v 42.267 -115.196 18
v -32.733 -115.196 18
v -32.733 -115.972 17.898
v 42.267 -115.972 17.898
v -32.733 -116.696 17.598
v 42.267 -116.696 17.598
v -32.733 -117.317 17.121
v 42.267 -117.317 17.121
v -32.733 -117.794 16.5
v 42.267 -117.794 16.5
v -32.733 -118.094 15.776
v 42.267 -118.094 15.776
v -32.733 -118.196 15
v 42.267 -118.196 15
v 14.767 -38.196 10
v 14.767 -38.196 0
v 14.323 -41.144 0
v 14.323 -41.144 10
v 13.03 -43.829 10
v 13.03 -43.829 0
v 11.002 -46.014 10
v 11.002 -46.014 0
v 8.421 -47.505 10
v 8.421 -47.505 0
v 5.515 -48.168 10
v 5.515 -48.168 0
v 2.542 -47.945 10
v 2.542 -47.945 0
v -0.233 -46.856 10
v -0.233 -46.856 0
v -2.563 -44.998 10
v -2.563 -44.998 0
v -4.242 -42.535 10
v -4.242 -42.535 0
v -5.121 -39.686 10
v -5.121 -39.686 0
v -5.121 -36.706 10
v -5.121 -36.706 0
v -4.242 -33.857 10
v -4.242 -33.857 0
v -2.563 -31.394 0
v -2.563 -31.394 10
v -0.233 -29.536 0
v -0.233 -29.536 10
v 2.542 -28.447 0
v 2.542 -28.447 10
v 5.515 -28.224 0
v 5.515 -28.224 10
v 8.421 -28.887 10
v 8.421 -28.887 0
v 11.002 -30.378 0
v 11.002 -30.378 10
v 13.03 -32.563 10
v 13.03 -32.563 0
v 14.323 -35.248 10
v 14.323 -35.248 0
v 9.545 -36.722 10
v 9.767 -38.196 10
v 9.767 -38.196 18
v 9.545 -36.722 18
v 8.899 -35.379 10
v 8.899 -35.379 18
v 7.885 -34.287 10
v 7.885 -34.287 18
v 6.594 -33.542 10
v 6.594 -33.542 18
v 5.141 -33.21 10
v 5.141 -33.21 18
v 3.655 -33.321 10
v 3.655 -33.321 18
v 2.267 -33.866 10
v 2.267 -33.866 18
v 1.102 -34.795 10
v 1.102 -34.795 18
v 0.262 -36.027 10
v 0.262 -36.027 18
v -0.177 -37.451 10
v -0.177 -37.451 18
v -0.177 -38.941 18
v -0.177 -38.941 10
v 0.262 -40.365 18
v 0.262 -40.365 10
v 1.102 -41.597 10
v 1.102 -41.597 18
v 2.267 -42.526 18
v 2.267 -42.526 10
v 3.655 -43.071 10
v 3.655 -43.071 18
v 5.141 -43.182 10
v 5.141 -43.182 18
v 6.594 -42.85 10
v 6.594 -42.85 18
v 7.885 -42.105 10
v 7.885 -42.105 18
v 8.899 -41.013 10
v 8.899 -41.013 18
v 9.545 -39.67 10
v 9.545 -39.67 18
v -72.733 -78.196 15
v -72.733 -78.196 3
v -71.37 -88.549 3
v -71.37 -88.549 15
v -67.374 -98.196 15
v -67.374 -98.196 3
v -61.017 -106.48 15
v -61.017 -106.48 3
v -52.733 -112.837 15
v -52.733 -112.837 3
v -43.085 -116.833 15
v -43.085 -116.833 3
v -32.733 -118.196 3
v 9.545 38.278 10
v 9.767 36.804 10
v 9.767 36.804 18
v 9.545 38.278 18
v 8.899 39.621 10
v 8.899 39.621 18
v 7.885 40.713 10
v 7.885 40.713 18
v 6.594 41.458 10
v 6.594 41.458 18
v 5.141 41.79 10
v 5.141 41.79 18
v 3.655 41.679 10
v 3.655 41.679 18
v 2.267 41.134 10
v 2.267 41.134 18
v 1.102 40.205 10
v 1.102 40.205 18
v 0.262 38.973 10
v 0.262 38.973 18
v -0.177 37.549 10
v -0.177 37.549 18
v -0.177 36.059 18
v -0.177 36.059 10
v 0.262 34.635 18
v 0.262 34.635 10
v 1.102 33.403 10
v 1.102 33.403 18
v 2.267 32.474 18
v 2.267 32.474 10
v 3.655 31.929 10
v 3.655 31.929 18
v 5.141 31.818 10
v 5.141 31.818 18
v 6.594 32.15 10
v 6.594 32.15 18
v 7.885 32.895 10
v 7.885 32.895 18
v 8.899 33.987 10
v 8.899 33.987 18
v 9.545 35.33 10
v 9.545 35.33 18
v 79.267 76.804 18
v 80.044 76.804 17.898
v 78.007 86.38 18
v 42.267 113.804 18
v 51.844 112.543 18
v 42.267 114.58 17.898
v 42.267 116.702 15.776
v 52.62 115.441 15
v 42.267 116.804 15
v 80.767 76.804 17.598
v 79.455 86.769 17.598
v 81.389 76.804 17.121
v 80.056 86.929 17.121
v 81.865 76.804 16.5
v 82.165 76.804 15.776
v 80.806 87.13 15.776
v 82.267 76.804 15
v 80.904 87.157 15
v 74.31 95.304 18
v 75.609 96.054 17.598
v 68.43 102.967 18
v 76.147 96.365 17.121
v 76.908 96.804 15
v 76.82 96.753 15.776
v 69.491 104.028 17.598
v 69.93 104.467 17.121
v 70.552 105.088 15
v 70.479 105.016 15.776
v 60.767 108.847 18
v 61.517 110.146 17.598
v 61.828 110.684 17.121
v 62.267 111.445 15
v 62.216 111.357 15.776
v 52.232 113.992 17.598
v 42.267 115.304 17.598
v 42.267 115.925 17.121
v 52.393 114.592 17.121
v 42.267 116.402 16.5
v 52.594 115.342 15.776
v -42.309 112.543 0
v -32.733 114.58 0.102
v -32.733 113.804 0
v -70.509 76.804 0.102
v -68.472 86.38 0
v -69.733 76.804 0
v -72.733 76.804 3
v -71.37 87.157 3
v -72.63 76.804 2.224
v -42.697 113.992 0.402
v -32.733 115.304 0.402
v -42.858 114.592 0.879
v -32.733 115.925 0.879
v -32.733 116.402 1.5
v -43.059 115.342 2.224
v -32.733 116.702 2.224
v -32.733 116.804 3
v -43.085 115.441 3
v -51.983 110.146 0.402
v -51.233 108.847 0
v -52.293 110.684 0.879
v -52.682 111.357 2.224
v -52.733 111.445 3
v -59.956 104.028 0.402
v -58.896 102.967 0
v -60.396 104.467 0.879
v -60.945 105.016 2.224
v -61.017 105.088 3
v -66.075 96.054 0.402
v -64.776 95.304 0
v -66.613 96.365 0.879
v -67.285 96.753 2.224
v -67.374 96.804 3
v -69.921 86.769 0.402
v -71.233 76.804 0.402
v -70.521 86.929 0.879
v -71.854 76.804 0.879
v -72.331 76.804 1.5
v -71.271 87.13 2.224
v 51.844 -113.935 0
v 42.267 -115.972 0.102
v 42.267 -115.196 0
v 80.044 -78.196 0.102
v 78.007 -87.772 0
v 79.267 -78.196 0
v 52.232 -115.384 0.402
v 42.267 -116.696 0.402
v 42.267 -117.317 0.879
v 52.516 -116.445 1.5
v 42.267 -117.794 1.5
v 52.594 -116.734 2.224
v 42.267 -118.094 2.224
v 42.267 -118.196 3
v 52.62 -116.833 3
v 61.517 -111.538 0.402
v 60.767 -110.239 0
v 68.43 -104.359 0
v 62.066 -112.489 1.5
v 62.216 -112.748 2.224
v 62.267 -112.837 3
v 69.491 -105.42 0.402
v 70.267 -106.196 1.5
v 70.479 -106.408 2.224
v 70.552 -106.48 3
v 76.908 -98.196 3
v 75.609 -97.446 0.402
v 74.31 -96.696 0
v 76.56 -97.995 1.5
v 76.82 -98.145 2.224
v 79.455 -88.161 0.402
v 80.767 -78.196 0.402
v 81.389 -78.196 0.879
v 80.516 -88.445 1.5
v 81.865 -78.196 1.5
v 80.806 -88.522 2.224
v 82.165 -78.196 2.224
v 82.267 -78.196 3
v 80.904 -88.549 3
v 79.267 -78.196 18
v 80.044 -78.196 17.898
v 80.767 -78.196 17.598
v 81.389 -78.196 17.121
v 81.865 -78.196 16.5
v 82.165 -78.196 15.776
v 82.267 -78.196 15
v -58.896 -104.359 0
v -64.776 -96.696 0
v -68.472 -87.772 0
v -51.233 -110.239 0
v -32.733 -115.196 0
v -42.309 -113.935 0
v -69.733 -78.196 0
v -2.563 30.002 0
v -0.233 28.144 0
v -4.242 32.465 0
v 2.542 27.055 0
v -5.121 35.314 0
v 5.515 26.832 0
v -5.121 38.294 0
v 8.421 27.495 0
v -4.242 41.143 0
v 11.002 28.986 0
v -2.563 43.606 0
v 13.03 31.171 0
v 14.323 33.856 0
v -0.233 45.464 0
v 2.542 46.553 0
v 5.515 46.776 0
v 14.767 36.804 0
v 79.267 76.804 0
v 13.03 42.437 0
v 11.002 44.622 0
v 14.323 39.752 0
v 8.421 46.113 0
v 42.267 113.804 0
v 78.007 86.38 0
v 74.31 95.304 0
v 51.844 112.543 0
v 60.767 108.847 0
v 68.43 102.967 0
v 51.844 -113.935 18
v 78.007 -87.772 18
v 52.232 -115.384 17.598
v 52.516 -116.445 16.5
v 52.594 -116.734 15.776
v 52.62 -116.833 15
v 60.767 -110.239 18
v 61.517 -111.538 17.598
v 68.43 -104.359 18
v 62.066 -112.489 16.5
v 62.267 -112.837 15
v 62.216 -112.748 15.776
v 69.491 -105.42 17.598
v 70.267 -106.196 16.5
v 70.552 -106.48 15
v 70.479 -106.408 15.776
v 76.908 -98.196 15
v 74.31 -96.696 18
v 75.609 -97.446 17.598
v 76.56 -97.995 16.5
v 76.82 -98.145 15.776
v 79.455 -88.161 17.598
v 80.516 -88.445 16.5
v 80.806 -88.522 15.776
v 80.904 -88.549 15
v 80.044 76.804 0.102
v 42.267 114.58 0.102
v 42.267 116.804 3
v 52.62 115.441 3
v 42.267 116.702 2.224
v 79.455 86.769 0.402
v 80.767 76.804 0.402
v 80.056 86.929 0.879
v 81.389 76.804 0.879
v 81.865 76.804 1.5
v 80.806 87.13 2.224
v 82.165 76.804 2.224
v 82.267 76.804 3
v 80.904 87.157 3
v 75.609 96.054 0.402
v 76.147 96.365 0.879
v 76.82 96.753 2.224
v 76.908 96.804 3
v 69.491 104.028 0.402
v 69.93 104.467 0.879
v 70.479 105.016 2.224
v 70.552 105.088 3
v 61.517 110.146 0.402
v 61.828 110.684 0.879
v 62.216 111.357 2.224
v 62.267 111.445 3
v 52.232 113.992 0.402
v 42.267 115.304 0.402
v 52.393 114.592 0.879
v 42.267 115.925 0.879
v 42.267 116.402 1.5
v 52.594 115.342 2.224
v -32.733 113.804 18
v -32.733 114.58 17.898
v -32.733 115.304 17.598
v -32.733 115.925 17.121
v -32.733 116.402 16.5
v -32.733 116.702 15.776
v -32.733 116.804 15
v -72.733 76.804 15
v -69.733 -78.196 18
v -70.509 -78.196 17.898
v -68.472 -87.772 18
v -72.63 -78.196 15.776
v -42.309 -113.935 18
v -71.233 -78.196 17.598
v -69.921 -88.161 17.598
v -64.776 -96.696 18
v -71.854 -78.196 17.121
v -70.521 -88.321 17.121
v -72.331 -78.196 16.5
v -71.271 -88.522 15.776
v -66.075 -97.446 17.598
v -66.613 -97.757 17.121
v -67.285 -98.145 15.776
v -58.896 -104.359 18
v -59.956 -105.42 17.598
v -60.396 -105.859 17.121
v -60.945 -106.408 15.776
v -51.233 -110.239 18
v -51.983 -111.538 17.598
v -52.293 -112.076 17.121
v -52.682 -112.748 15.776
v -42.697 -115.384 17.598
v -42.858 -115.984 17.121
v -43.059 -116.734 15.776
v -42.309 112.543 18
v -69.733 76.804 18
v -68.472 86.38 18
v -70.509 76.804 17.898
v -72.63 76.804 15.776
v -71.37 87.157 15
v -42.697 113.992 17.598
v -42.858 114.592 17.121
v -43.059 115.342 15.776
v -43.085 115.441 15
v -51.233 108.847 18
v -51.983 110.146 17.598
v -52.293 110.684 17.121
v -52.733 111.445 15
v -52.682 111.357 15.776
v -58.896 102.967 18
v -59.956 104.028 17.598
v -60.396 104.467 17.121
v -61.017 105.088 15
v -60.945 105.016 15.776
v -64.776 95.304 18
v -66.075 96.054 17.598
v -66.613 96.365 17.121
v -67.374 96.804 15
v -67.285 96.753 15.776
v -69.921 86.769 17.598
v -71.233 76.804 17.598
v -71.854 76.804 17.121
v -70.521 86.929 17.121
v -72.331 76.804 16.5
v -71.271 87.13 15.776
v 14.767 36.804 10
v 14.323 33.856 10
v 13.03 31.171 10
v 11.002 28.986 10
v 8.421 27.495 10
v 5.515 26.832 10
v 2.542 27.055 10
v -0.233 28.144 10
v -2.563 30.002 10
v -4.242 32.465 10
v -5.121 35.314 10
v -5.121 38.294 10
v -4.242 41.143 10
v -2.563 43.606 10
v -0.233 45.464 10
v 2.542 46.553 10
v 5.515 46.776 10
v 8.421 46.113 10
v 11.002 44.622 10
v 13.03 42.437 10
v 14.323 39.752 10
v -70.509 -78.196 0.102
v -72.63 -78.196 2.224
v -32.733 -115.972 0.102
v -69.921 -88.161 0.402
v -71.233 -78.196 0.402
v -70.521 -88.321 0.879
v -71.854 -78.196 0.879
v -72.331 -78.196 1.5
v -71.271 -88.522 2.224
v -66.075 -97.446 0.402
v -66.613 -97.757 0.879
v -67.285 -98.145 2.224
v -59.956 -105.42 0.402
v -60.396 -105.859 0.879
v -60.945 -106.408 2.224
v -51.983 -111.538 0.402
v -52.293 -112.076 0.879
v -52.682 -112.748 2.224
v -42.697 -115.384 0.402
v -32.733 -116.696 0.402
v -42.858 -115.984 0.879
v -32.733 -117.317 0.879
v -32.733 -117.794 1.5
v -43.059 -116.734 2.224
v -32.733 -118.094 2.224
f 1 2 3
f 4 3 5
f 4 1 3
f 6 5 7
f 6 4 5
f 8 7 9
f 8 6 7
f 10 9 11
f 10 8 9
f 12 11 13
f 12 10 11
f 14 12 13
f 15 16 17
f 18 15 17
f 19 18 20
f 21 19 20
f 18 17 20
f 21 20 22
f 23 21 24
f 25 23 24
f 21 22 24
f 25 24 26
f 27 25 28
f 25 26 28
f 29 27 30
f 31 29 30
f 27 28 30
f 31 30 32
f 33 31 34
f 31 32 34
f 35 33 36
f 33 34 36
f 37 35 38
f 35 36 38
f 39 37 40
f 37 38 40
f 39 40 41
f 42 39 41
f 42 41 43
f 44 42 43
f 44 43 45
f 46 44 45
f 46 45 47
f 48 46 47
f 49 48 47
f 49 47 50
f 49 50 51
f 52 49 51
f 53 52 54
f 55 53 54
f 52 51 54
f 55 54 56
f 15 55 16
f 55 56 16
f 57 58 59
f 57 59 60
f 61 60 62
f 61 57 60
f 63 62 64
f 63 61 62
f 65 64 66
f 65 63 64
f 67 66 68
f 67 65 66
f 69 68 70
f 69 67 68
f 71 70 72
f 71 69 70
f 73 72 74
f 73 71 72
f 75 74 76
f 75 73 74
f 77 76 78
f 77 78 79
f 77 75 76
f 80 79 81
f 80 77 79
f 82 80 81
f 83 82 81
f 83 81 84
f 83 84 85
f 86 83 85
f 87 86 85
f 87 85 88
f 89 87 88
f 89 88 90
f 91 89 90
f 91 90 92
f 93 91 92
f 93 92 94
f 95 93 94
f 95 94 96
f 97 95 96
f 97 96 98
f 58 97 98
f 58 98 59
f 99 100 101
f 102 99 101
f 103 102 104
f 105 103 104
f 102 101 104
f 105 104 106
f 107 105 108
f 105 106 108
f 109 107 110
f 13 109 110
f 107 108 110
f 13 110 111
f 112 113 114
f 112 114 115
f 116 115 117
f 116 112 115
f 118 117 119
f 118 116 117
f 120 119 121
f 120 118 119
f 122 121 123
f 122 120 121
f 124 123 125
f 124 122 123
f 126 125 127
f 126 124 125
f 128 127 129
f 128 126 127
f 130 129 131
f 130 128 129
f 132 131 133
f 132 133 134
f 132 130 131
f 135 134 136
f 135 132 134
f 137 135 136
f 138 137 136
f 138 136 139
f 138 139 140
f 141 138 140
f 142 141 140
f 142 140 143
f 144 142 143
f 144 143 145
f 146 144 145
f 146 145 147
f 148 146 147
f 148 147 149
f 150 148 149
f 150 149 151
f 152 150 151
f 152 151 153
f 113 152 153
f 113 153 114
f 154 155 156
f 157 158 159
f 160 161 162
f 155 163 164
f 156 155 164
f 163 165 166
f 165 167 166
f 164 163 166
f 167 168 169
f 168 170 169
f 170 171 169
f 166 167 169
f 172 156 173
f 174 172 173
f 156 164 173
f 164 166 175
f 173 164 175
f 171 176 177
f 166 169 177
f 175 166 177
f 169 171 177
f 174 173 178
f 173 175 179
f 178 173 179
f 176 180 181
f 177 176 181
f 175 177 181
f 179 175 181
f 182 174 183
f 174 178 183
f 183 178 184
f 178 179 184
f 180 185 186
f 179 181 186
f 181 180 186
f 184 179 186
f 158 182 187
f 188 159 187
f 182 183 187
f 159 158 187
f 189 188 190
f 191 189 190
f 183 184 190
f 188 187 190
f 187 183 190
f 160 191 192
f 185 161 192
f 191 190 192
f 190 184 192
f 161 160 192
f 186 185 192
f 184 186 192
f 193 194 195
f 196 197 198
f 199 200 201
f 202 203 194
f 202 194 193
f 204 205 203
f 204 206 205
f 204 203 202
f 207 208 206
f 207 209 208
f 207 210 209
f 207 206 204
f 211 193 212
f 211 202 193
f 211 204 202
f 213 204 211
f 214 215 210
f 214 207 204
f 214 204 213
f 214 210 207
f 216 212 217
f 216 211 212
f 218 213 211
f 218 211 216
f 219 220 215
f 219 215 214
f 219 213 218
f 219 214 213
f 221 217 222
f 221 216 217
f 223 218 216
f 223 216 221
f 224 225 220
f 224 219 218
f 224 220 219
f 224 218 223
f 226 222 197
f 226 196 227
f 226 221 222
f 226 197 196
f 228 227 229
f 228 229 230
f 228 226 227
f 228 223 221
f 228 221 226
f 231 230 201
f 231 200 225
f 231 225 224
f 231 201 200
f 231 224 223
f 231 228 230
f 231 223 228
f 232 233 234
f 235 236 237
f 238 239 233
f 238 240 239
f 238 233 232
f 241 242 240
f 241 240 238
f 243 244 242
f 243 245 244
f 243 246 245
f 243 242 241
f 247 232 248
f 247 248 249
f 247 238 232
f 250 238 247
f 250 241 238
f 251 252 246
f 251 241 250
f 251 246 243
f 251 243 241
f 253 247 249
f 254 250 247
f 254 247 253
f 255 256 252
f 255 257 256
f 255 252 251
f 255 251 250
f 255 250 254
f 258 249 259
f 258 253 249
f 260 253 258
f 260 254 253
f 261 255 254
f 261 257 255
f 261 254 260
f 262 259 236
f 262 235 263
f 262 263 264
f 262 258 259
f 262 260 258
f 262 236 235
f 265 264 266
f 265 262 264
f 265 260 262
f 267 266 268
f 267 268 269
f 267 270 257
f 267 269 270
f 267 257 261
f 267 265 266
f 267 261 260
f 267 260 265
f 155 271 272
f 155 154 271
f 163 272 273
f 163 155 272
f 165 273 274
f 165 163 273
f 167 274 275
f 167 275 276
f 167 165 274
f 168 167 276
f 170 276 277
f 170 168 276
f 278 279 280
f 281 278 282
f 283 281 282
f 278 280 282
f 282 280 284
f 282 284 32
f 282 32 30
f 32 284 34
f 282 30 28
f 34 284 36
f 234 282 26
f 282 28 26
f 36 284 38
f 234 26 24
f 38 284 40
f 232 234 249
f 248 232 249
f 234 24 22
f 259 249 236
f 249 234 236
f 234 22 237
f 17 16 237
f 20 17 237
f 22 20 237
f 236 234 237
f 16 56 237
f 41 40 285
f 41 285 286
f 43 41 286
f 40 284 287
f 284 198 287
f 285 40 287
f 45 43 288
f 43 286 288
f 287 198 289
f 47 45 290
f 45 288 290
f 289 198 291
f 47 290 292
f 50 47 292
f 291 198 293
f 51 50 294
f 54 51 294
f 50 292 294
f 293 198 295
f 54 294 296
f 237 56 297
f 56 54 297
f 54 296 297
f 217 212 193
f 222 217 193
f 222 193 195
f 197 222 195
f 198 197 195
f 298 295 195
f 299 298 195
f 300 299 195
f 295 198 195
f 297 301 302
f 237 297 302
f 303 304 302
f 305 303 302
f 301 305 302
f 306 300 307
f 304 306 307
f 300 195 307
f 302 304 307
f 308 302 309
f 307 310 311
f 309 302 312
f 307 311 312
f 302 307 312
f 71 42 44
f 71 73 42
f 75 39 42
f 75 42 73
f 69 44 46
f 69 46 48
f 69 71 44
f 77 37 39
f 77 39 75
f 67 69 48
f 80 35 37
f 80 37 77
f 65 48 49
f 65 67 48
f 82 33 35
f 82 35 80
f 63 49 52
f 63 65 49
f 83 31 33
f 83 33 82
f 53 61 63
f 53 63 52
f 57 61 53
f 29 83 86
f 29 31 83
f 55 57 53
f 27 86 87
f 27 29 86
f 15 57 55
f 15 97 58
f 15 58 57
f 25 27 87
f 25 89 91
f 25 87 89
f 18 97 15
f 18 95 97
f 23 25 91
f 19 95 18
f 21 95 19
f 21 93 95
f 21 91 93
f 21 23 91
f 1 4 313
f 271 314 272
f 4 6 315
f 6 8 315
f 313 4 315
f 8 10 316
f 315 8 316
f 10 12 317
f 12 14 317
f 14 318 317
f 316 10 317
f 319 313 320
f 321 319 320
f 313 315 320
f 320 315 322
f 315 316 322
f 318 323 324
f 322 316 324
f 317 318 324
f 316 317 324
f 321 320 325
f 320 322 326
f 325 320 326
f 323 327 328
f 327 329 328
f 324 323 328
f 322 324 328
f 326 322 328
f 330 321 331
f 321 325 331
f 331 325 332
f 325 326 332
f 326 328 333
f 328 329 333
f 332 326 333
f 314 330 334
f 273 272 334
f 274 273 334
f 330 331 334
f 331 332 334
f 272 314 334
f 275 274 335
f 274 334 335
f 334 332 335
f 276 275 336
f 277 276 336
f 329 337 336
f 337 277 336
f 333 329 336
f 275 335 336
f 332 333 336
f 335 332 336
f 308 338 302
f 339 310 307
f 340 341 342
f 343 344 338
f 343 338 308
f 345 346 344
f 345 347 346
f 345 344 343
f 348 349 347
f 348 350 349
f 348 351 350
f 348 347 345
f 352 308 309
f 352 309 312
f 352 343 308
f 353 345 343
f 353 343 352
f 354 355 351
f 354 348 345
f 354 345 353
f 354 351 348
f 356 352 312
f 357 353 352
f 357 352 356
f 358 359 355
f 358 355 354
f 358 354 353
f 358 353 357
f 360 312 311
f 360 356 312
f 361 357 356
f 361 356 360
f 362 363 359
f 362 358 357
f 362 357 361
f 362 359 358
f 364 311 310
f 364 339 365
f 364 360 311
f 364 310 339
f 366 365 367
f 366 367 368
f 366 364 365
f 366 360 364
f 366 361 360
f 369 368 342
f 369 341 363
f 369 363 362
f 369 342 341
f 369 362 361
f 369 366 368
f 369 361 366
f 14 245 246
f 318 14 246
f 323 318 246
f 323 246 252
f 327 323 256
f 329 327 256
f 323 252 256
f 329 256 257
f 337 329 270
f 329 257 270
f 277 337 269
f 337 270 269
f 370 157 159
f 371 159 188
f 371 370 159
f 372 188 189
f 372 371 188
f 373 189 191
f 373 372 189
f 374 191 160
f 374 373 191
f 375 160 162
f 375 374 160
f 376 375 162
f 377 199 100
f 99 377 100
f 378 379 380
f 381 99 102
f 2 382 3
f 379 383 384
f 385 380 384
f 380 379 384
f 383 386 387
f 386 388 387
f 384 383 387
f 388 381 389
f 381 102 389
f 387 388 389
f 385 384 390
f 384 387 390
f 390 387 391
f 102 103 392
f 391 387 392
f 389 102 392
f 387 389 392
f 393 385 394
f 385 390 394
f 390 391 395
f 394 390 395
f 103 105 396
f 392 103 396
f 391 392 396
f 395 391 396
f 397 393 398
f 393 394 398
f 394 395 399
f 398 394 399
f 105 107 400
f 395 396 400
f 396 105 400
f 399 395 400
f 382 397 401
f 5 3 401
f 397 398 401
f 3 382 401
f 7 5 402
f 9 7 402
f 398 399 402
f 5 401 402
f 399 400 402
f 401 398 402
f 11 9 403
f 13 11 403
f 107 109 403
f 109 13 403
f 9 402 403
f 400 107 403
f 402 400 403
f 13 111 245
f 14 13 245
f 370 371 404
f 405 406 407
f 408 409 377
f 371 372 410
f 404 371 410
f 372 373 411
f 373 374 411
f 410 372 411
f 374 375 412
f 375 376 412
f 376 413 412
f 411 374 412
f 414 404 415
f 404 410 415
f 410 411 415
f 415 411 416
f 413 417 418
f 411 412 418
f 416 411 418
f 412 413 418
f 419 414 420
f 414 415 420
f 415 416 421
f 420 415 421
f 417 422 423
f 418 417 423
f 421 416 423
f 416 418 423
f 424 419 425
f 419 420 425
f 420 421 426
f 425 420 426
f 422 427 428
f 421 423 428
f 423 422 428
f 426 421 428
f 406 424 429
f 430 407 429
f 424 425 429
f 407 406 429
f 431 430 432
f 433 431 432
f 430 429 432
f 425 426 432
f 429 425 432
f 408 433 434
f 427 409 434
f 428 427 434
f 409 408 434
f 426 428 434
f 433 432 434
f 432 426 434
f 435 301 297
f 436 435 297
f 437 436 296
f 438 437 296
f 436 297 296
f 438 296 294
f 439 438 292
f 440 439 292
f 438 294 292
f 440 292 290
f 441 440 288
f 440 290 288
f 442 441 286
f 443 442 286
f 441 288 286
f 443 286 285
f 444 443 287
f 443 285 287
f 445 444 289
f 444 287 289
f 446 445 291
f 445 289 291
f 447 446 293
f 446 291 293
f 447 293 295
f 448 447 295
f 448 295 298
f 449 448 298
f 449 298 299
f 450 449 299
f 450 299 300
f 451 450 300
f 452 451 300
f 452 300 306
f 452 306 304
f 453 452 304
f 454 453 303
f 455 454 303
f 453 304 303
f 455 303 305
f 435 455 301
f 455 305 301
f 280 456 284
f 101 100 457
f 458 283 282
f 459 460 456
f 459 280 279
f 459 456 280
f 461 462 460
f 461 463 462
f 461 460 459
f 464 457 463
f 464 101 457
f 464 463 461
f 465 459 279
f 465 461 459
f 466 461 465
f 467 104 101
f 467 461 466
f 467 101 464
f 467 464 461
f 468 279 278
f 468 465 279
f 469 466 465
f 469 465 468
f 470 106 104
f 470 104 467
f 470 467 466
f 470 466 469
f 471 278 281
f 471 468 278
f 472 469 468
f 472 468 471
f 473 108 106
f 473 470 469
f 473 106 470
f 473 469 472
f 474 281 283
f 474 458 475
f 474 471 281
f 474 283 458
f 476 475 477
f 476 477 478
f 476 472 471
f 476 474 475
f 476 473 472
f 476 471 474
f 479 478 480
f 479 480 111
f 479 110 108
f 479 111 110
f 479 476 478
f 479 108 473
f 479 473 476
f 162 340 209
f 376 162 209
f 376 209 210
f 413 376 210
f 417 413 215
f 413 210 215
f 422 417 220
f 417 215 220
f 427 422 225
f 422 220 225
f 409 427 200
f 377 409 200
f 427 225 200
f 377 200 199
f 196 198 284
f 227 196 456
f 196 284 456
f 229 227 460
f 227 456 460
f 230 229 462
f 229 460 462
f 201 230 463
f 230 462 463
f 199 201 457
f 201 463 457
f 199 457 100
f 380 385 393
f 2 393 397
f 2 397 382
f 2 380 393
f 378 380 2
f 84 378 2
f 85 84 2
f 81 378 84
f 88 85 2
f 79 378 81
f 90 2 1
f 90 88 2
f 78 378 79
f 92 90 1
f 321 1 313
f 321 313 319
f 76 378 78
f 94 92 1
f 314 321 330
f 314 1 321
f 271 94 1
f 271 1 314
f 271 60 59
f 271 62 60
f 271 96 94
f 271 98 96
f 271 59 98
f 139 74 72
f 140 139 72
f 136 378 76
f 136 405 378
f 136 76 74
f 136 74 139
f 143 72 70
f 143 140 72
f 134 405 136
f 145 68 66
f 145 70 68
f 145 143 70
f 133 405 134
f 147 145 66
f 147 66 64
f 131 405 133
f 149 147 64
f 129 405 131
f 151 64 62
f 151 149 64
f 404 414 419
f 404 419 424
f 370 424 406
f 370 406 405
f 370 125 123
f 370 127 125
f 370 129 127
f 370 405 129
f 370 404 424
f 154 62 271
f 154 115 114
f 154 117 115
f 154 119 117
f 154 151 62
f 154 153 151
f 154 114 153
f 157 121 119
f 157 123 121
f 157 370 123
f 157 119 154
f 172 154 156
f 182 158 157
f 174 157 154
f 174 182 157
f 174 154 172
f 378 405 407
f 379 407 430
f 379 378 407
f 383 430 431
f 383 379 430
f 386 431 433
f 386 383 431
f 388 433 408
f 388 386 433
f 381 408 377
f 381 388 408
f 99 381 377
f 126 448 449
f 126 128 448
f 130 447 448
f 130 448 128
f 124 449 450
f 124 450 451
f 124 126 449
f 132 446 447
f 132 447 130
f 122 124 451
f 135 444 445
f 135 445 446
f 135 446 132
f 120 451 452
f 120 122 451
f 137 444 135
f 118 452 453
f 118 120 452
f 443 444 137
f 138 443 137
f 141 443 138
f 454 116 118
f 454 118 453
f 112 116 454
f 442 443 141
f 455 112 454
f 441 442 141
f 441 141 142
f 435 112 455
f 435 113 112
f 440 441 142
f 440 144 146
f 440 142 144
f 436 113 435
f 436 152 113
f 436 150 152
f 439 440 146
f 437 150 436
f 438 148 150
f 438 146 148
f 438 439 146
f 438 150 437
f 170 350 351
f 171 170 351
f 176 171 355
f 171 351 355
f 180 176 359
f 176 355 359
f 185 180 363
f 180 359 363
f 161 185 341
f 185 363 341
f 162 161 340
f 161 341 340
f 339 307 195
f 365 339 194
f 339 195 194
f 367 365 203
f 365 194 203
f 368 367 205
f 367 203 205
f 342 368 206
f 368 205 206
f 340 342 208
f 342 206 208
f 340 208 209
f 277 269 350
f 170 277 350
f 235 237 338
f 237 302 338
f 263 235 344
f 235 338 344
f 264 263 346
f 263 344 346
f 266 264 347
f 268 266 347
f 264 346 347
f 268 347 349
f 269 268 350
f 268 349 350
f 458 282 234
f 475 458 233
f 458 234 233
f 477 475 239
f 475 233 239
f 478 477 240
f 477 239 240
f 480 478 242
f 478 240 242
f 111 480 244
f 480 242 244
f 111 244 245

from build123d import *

# Parameters (mm, degrees)
F0_R     = 5
F1_DEPTH = 18
F2_R     = 10
F3_DEPTH = 10
F4_R     = 3


with BuildPart() as f1:
    # F0 (on Top) → F1 (new body)
    with BuildSketch(Plane.XY):
        with BuildLine():
            ThreePointArc((-72.732671, -78.195973), (-61.016942, -106.480244), (-32.732671, -118.195973))
            Line((-32.732671, -118.195973), (42.267329, -118.195973))
            ThreePointArc((42.267329, -118.195973), (70.5516, -106.480244), (82.267329, -78.195973))
            Line((82.267329, -78.195973), (82.267329, 76.804027))
            ThreePointArc((82.267329, 76.804027), (70.5516, 105.088298), (42.267329, 116.804027))
            Line((42.267329, 116.804027), (-32.732671, 116.804027))
            ThreePointArc((-32.732671, 116.804027), (-61.016942, 105.088298), (-72.732671, 76.804027))
            Line((-72.732671, 76.804027), (-72.732671, -78.195973))
        make_face()
        with Locations((4.767329, -38.195973)):
            Circle(F0_R, mode=Mode.SUBTRACT)
        with Locations((4.767329, 36.804027)):
            Circle(F0_R, mode=Mode.SUBTRACT)
    extrude(amount=F1_DEPTH)

    # F2 (on face) → F3 (cut)
    with BuildSketch(Plane(origin=(0, 0, 0), x_dir=(1, 0, 0), z_dir=(0, 0, -1))):
        with Locations((4.767329, 38.195973)):
            Circle(F2_R)
        with Locations((4.767329, -36.804027)):
            Circle(F2_R)
    extrude(amount=-F3_DEPTH, mode=Mode.SUBTRACT)

    # F4
    f4_edges = [f1.edges().sort_by_distance(p)[0] for p in [
        (82.267329, -0.695973, 18),
        (82.267329, -0.695973, 0),
    ]]
    fillet(f4_edges, radius=F4_R)


solid = f1.part
